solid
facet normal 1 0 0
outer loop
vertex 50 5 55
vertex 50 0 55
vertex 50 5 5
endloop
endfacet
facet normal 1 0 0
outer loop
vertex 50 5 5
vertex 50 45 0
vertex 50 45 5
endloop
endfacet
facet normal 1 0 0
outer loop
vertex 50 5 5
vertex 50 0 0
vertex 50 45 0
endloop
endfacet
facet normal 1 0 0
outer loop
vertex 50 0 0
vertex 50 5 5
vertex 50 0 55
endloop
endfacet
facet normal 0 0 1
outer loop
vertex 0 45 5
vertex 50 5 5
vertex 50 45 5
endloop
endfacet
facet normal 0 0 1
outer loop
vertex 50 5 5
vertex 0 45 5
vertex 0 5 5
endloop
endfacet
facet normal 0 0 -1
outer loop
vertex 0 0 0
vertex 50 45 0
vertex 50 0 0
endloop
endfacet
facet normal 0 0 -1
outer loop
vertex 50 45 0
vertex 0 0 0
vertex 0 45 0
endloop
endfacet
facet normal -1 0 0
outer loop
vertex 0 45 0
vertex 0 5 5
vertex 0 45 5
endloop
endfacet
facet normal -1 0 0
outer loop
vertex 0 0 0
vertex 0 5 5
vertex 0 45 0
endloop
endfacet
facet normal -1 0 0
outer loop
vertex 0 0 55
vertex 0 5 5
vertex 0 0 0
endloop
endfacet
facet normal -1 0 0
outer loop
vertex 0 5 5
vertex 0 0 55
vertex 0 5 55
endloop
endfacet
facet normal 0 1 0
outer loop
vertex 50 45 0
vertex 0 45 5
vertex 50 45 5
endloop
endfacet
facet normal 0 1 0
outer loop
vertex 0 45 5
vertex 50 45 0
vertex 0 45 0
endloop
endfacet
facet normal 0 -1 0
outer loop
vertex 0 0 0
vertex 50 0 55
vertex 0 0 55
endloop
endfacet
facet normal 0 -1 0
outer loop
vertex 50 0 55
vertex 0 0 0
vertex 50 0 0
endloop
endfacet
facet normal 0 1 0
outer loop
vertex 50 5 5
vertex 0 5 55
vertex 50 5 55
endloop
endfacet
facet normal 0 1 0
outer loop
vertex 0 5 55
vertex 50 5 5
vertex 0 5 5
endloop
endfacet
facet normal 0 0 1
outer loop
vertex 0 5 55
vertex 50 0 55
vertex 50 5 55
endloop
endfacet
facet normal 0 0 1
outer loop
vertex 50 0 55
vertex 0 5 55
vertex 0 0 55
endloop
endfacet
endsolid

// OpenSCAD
// Dimensions for the L-shaped mounting bracket

// Base Plate Dimensions
base_plate_x_max = 25; // Max X extent of the base plate
base_plate_x_min = -25; // Min X extent of the base plate
base_plate_y_max = 45; // Max Y extent of the base plate
base_plate_y_min = 0;  // Min Y extent of the base plate
base_plate_z_max = 5;  // Max Z height of the base plate (Thickness)

// Through-hole dimensions for Base Plate
hole1_x = -17;
hole1_y = 30;
hole2_x = 17;
hole2_y = 30;
hole_diameter = 4.5; // Diameter of the M4 holes

// Vertical Motor Plate Dimensions
motor_plate_x_max = 25; // Max X extent of the motor plate
motor_plate_x_min = -25; // Min X extent of the motor plate
motor_plate_y_max = 5;  // Max Y extent of the motor plate
motor_plate_y_min = 0;  // Min Y extent of the motor plate
motor_plate_z_max = 50; // Max Z height of the motor plate
motor_plate_thickness = 5; // Assuming thickness matches base plate for structural integrity

// Motor Centring Boss Hole Dimensions
boss_hole_x = 0;
boss_hole_z = 28;
boss_hole_diameter = 23;

// M3 Screw Pattern Dimensions
screw_pattern_size = 31; // Size of the square pattern for screws
screw_spacing = 3.4; // Distance between screw centers (implied by a 31mm square)
screw_radius = screw_pattern_size / 2;

// Gusset Dimensions
gusset_thickness = 5; // Thickness of the triangular gussets
gusset_leg_length = 20; // Length of the legs along +Y and +Z

// --- Base Plate Construction ---
module base_plate() {
    cube([base_plate_x_max - base_plate_x_min, base_plate_y_max - base_plate_y_min, base_plate_z_max]);
}

// Create the main body of the base plate
difference() {
    base_plate();
    
    // Vertical through-holes (M4)
    translate([hole1_x, hole1_y, 0])
        cylinder(r = hole_diameter / 2, h = base_plate_z_max + 1, $fn=64);
    
    translate([hole2_x, hole2_y, 0])
        cylinder(r = hole_diameter / 2, h = base_plate_z_max + 1, $fn=64);
}

// --- Vertical Motor Plate Construction ---
module motor_plate() {
    cube([motor_plate_x_max - motor_plate_x_min, motor_plate_y_max - motor_plate_y_min, motor_plate_z_max]);
}

// Create the main body of the motor plate
difference() {
    motor_plate();
    
    // Cut the 23mm centering boss hole (along Y axis)
    translate([boss_hole_x, 0, boss_hole_z - 0.1]) // Slightly below Z=28 to ensure cut goes through
        cylinder(r = boss_hole_diameter / 2, h = motor_plate_z_max + 1, $fn=64);

    // Cut the four M3 screw holes (3.4mm diameter) on a 31mm square pattern centered at (0, 28)
    for (i = [0 : 2]) {
        for (j = [0 : 2]) {
            screw_x = -screw_radius + i * screw_spacing;
            screw_y = 28 - screw_radius + j * screw_spacing;
            
            translate([screw_x, screw_y, 0])
                cylinder(r = 3.4 / 2, h = motor_plate_z_max + 1, $fn=64);
        }
    }
}

// --- Triangular Gussets Construction ---
module gusset_left() {
    // Right triangle in the YZ plane, right angle at (y=5, z=5)
    polygon(points = [
        [5, 5],      // Right angle corner
        [25, 5],     // End of Y leg (y=5+20=25, z=5)
        [5, 25]      // End of Z leg (y=5, z=5+20=25)
    ]);
}

module gusset_right() {
    // Right triangle in the YZ plane, right angle at (y=5, z=5)
    polygon(points = [
        [5, 5],      // Right angle corner
        [-15, 5],     // End of Y leg (y=5-20=-15, z=5)
        [5, 25]      // End of Z leg (y=5, z=5+20=25)
    ]);
}


// --- Assembly ---

// 1. Base Plate (Base structure)
base_plate();

// 2. Motor Plate (Positioned on the back edge of the base plate, assuming it sits on Y=45 boundary or adjacent to it)
// Placing motor plate centered in X and sitting on top of the base plate volume.
translate([0, 0, base_plate_z_max]) // Lift motor plate up by base plate thickness (Z=5)
    motor_plate();


// 3. Gussets (Attached to the sides of the overall structure)

// Left Gusset: Attached near x=-25 edge. Positioned at Y=10 for visibility, attached to the side face.
translate([-25, 10, 0]) // Position origin at the left edge of the base plate
    rotate([90, 0, 0]) // Rotate so YZ plane is aligned with the triangle definition
    gusset_left();

// Right Gusset: Attached near x=25 edge. Positioned at Y=10 for visibility, attached to the side face.
translate([25, 10, 0]) // Position origin at the right edge of the base plate
    rotate([90, 0, 0]) // Rotate so YZ plane is aligned with the triangle definition
    gusset_right();
